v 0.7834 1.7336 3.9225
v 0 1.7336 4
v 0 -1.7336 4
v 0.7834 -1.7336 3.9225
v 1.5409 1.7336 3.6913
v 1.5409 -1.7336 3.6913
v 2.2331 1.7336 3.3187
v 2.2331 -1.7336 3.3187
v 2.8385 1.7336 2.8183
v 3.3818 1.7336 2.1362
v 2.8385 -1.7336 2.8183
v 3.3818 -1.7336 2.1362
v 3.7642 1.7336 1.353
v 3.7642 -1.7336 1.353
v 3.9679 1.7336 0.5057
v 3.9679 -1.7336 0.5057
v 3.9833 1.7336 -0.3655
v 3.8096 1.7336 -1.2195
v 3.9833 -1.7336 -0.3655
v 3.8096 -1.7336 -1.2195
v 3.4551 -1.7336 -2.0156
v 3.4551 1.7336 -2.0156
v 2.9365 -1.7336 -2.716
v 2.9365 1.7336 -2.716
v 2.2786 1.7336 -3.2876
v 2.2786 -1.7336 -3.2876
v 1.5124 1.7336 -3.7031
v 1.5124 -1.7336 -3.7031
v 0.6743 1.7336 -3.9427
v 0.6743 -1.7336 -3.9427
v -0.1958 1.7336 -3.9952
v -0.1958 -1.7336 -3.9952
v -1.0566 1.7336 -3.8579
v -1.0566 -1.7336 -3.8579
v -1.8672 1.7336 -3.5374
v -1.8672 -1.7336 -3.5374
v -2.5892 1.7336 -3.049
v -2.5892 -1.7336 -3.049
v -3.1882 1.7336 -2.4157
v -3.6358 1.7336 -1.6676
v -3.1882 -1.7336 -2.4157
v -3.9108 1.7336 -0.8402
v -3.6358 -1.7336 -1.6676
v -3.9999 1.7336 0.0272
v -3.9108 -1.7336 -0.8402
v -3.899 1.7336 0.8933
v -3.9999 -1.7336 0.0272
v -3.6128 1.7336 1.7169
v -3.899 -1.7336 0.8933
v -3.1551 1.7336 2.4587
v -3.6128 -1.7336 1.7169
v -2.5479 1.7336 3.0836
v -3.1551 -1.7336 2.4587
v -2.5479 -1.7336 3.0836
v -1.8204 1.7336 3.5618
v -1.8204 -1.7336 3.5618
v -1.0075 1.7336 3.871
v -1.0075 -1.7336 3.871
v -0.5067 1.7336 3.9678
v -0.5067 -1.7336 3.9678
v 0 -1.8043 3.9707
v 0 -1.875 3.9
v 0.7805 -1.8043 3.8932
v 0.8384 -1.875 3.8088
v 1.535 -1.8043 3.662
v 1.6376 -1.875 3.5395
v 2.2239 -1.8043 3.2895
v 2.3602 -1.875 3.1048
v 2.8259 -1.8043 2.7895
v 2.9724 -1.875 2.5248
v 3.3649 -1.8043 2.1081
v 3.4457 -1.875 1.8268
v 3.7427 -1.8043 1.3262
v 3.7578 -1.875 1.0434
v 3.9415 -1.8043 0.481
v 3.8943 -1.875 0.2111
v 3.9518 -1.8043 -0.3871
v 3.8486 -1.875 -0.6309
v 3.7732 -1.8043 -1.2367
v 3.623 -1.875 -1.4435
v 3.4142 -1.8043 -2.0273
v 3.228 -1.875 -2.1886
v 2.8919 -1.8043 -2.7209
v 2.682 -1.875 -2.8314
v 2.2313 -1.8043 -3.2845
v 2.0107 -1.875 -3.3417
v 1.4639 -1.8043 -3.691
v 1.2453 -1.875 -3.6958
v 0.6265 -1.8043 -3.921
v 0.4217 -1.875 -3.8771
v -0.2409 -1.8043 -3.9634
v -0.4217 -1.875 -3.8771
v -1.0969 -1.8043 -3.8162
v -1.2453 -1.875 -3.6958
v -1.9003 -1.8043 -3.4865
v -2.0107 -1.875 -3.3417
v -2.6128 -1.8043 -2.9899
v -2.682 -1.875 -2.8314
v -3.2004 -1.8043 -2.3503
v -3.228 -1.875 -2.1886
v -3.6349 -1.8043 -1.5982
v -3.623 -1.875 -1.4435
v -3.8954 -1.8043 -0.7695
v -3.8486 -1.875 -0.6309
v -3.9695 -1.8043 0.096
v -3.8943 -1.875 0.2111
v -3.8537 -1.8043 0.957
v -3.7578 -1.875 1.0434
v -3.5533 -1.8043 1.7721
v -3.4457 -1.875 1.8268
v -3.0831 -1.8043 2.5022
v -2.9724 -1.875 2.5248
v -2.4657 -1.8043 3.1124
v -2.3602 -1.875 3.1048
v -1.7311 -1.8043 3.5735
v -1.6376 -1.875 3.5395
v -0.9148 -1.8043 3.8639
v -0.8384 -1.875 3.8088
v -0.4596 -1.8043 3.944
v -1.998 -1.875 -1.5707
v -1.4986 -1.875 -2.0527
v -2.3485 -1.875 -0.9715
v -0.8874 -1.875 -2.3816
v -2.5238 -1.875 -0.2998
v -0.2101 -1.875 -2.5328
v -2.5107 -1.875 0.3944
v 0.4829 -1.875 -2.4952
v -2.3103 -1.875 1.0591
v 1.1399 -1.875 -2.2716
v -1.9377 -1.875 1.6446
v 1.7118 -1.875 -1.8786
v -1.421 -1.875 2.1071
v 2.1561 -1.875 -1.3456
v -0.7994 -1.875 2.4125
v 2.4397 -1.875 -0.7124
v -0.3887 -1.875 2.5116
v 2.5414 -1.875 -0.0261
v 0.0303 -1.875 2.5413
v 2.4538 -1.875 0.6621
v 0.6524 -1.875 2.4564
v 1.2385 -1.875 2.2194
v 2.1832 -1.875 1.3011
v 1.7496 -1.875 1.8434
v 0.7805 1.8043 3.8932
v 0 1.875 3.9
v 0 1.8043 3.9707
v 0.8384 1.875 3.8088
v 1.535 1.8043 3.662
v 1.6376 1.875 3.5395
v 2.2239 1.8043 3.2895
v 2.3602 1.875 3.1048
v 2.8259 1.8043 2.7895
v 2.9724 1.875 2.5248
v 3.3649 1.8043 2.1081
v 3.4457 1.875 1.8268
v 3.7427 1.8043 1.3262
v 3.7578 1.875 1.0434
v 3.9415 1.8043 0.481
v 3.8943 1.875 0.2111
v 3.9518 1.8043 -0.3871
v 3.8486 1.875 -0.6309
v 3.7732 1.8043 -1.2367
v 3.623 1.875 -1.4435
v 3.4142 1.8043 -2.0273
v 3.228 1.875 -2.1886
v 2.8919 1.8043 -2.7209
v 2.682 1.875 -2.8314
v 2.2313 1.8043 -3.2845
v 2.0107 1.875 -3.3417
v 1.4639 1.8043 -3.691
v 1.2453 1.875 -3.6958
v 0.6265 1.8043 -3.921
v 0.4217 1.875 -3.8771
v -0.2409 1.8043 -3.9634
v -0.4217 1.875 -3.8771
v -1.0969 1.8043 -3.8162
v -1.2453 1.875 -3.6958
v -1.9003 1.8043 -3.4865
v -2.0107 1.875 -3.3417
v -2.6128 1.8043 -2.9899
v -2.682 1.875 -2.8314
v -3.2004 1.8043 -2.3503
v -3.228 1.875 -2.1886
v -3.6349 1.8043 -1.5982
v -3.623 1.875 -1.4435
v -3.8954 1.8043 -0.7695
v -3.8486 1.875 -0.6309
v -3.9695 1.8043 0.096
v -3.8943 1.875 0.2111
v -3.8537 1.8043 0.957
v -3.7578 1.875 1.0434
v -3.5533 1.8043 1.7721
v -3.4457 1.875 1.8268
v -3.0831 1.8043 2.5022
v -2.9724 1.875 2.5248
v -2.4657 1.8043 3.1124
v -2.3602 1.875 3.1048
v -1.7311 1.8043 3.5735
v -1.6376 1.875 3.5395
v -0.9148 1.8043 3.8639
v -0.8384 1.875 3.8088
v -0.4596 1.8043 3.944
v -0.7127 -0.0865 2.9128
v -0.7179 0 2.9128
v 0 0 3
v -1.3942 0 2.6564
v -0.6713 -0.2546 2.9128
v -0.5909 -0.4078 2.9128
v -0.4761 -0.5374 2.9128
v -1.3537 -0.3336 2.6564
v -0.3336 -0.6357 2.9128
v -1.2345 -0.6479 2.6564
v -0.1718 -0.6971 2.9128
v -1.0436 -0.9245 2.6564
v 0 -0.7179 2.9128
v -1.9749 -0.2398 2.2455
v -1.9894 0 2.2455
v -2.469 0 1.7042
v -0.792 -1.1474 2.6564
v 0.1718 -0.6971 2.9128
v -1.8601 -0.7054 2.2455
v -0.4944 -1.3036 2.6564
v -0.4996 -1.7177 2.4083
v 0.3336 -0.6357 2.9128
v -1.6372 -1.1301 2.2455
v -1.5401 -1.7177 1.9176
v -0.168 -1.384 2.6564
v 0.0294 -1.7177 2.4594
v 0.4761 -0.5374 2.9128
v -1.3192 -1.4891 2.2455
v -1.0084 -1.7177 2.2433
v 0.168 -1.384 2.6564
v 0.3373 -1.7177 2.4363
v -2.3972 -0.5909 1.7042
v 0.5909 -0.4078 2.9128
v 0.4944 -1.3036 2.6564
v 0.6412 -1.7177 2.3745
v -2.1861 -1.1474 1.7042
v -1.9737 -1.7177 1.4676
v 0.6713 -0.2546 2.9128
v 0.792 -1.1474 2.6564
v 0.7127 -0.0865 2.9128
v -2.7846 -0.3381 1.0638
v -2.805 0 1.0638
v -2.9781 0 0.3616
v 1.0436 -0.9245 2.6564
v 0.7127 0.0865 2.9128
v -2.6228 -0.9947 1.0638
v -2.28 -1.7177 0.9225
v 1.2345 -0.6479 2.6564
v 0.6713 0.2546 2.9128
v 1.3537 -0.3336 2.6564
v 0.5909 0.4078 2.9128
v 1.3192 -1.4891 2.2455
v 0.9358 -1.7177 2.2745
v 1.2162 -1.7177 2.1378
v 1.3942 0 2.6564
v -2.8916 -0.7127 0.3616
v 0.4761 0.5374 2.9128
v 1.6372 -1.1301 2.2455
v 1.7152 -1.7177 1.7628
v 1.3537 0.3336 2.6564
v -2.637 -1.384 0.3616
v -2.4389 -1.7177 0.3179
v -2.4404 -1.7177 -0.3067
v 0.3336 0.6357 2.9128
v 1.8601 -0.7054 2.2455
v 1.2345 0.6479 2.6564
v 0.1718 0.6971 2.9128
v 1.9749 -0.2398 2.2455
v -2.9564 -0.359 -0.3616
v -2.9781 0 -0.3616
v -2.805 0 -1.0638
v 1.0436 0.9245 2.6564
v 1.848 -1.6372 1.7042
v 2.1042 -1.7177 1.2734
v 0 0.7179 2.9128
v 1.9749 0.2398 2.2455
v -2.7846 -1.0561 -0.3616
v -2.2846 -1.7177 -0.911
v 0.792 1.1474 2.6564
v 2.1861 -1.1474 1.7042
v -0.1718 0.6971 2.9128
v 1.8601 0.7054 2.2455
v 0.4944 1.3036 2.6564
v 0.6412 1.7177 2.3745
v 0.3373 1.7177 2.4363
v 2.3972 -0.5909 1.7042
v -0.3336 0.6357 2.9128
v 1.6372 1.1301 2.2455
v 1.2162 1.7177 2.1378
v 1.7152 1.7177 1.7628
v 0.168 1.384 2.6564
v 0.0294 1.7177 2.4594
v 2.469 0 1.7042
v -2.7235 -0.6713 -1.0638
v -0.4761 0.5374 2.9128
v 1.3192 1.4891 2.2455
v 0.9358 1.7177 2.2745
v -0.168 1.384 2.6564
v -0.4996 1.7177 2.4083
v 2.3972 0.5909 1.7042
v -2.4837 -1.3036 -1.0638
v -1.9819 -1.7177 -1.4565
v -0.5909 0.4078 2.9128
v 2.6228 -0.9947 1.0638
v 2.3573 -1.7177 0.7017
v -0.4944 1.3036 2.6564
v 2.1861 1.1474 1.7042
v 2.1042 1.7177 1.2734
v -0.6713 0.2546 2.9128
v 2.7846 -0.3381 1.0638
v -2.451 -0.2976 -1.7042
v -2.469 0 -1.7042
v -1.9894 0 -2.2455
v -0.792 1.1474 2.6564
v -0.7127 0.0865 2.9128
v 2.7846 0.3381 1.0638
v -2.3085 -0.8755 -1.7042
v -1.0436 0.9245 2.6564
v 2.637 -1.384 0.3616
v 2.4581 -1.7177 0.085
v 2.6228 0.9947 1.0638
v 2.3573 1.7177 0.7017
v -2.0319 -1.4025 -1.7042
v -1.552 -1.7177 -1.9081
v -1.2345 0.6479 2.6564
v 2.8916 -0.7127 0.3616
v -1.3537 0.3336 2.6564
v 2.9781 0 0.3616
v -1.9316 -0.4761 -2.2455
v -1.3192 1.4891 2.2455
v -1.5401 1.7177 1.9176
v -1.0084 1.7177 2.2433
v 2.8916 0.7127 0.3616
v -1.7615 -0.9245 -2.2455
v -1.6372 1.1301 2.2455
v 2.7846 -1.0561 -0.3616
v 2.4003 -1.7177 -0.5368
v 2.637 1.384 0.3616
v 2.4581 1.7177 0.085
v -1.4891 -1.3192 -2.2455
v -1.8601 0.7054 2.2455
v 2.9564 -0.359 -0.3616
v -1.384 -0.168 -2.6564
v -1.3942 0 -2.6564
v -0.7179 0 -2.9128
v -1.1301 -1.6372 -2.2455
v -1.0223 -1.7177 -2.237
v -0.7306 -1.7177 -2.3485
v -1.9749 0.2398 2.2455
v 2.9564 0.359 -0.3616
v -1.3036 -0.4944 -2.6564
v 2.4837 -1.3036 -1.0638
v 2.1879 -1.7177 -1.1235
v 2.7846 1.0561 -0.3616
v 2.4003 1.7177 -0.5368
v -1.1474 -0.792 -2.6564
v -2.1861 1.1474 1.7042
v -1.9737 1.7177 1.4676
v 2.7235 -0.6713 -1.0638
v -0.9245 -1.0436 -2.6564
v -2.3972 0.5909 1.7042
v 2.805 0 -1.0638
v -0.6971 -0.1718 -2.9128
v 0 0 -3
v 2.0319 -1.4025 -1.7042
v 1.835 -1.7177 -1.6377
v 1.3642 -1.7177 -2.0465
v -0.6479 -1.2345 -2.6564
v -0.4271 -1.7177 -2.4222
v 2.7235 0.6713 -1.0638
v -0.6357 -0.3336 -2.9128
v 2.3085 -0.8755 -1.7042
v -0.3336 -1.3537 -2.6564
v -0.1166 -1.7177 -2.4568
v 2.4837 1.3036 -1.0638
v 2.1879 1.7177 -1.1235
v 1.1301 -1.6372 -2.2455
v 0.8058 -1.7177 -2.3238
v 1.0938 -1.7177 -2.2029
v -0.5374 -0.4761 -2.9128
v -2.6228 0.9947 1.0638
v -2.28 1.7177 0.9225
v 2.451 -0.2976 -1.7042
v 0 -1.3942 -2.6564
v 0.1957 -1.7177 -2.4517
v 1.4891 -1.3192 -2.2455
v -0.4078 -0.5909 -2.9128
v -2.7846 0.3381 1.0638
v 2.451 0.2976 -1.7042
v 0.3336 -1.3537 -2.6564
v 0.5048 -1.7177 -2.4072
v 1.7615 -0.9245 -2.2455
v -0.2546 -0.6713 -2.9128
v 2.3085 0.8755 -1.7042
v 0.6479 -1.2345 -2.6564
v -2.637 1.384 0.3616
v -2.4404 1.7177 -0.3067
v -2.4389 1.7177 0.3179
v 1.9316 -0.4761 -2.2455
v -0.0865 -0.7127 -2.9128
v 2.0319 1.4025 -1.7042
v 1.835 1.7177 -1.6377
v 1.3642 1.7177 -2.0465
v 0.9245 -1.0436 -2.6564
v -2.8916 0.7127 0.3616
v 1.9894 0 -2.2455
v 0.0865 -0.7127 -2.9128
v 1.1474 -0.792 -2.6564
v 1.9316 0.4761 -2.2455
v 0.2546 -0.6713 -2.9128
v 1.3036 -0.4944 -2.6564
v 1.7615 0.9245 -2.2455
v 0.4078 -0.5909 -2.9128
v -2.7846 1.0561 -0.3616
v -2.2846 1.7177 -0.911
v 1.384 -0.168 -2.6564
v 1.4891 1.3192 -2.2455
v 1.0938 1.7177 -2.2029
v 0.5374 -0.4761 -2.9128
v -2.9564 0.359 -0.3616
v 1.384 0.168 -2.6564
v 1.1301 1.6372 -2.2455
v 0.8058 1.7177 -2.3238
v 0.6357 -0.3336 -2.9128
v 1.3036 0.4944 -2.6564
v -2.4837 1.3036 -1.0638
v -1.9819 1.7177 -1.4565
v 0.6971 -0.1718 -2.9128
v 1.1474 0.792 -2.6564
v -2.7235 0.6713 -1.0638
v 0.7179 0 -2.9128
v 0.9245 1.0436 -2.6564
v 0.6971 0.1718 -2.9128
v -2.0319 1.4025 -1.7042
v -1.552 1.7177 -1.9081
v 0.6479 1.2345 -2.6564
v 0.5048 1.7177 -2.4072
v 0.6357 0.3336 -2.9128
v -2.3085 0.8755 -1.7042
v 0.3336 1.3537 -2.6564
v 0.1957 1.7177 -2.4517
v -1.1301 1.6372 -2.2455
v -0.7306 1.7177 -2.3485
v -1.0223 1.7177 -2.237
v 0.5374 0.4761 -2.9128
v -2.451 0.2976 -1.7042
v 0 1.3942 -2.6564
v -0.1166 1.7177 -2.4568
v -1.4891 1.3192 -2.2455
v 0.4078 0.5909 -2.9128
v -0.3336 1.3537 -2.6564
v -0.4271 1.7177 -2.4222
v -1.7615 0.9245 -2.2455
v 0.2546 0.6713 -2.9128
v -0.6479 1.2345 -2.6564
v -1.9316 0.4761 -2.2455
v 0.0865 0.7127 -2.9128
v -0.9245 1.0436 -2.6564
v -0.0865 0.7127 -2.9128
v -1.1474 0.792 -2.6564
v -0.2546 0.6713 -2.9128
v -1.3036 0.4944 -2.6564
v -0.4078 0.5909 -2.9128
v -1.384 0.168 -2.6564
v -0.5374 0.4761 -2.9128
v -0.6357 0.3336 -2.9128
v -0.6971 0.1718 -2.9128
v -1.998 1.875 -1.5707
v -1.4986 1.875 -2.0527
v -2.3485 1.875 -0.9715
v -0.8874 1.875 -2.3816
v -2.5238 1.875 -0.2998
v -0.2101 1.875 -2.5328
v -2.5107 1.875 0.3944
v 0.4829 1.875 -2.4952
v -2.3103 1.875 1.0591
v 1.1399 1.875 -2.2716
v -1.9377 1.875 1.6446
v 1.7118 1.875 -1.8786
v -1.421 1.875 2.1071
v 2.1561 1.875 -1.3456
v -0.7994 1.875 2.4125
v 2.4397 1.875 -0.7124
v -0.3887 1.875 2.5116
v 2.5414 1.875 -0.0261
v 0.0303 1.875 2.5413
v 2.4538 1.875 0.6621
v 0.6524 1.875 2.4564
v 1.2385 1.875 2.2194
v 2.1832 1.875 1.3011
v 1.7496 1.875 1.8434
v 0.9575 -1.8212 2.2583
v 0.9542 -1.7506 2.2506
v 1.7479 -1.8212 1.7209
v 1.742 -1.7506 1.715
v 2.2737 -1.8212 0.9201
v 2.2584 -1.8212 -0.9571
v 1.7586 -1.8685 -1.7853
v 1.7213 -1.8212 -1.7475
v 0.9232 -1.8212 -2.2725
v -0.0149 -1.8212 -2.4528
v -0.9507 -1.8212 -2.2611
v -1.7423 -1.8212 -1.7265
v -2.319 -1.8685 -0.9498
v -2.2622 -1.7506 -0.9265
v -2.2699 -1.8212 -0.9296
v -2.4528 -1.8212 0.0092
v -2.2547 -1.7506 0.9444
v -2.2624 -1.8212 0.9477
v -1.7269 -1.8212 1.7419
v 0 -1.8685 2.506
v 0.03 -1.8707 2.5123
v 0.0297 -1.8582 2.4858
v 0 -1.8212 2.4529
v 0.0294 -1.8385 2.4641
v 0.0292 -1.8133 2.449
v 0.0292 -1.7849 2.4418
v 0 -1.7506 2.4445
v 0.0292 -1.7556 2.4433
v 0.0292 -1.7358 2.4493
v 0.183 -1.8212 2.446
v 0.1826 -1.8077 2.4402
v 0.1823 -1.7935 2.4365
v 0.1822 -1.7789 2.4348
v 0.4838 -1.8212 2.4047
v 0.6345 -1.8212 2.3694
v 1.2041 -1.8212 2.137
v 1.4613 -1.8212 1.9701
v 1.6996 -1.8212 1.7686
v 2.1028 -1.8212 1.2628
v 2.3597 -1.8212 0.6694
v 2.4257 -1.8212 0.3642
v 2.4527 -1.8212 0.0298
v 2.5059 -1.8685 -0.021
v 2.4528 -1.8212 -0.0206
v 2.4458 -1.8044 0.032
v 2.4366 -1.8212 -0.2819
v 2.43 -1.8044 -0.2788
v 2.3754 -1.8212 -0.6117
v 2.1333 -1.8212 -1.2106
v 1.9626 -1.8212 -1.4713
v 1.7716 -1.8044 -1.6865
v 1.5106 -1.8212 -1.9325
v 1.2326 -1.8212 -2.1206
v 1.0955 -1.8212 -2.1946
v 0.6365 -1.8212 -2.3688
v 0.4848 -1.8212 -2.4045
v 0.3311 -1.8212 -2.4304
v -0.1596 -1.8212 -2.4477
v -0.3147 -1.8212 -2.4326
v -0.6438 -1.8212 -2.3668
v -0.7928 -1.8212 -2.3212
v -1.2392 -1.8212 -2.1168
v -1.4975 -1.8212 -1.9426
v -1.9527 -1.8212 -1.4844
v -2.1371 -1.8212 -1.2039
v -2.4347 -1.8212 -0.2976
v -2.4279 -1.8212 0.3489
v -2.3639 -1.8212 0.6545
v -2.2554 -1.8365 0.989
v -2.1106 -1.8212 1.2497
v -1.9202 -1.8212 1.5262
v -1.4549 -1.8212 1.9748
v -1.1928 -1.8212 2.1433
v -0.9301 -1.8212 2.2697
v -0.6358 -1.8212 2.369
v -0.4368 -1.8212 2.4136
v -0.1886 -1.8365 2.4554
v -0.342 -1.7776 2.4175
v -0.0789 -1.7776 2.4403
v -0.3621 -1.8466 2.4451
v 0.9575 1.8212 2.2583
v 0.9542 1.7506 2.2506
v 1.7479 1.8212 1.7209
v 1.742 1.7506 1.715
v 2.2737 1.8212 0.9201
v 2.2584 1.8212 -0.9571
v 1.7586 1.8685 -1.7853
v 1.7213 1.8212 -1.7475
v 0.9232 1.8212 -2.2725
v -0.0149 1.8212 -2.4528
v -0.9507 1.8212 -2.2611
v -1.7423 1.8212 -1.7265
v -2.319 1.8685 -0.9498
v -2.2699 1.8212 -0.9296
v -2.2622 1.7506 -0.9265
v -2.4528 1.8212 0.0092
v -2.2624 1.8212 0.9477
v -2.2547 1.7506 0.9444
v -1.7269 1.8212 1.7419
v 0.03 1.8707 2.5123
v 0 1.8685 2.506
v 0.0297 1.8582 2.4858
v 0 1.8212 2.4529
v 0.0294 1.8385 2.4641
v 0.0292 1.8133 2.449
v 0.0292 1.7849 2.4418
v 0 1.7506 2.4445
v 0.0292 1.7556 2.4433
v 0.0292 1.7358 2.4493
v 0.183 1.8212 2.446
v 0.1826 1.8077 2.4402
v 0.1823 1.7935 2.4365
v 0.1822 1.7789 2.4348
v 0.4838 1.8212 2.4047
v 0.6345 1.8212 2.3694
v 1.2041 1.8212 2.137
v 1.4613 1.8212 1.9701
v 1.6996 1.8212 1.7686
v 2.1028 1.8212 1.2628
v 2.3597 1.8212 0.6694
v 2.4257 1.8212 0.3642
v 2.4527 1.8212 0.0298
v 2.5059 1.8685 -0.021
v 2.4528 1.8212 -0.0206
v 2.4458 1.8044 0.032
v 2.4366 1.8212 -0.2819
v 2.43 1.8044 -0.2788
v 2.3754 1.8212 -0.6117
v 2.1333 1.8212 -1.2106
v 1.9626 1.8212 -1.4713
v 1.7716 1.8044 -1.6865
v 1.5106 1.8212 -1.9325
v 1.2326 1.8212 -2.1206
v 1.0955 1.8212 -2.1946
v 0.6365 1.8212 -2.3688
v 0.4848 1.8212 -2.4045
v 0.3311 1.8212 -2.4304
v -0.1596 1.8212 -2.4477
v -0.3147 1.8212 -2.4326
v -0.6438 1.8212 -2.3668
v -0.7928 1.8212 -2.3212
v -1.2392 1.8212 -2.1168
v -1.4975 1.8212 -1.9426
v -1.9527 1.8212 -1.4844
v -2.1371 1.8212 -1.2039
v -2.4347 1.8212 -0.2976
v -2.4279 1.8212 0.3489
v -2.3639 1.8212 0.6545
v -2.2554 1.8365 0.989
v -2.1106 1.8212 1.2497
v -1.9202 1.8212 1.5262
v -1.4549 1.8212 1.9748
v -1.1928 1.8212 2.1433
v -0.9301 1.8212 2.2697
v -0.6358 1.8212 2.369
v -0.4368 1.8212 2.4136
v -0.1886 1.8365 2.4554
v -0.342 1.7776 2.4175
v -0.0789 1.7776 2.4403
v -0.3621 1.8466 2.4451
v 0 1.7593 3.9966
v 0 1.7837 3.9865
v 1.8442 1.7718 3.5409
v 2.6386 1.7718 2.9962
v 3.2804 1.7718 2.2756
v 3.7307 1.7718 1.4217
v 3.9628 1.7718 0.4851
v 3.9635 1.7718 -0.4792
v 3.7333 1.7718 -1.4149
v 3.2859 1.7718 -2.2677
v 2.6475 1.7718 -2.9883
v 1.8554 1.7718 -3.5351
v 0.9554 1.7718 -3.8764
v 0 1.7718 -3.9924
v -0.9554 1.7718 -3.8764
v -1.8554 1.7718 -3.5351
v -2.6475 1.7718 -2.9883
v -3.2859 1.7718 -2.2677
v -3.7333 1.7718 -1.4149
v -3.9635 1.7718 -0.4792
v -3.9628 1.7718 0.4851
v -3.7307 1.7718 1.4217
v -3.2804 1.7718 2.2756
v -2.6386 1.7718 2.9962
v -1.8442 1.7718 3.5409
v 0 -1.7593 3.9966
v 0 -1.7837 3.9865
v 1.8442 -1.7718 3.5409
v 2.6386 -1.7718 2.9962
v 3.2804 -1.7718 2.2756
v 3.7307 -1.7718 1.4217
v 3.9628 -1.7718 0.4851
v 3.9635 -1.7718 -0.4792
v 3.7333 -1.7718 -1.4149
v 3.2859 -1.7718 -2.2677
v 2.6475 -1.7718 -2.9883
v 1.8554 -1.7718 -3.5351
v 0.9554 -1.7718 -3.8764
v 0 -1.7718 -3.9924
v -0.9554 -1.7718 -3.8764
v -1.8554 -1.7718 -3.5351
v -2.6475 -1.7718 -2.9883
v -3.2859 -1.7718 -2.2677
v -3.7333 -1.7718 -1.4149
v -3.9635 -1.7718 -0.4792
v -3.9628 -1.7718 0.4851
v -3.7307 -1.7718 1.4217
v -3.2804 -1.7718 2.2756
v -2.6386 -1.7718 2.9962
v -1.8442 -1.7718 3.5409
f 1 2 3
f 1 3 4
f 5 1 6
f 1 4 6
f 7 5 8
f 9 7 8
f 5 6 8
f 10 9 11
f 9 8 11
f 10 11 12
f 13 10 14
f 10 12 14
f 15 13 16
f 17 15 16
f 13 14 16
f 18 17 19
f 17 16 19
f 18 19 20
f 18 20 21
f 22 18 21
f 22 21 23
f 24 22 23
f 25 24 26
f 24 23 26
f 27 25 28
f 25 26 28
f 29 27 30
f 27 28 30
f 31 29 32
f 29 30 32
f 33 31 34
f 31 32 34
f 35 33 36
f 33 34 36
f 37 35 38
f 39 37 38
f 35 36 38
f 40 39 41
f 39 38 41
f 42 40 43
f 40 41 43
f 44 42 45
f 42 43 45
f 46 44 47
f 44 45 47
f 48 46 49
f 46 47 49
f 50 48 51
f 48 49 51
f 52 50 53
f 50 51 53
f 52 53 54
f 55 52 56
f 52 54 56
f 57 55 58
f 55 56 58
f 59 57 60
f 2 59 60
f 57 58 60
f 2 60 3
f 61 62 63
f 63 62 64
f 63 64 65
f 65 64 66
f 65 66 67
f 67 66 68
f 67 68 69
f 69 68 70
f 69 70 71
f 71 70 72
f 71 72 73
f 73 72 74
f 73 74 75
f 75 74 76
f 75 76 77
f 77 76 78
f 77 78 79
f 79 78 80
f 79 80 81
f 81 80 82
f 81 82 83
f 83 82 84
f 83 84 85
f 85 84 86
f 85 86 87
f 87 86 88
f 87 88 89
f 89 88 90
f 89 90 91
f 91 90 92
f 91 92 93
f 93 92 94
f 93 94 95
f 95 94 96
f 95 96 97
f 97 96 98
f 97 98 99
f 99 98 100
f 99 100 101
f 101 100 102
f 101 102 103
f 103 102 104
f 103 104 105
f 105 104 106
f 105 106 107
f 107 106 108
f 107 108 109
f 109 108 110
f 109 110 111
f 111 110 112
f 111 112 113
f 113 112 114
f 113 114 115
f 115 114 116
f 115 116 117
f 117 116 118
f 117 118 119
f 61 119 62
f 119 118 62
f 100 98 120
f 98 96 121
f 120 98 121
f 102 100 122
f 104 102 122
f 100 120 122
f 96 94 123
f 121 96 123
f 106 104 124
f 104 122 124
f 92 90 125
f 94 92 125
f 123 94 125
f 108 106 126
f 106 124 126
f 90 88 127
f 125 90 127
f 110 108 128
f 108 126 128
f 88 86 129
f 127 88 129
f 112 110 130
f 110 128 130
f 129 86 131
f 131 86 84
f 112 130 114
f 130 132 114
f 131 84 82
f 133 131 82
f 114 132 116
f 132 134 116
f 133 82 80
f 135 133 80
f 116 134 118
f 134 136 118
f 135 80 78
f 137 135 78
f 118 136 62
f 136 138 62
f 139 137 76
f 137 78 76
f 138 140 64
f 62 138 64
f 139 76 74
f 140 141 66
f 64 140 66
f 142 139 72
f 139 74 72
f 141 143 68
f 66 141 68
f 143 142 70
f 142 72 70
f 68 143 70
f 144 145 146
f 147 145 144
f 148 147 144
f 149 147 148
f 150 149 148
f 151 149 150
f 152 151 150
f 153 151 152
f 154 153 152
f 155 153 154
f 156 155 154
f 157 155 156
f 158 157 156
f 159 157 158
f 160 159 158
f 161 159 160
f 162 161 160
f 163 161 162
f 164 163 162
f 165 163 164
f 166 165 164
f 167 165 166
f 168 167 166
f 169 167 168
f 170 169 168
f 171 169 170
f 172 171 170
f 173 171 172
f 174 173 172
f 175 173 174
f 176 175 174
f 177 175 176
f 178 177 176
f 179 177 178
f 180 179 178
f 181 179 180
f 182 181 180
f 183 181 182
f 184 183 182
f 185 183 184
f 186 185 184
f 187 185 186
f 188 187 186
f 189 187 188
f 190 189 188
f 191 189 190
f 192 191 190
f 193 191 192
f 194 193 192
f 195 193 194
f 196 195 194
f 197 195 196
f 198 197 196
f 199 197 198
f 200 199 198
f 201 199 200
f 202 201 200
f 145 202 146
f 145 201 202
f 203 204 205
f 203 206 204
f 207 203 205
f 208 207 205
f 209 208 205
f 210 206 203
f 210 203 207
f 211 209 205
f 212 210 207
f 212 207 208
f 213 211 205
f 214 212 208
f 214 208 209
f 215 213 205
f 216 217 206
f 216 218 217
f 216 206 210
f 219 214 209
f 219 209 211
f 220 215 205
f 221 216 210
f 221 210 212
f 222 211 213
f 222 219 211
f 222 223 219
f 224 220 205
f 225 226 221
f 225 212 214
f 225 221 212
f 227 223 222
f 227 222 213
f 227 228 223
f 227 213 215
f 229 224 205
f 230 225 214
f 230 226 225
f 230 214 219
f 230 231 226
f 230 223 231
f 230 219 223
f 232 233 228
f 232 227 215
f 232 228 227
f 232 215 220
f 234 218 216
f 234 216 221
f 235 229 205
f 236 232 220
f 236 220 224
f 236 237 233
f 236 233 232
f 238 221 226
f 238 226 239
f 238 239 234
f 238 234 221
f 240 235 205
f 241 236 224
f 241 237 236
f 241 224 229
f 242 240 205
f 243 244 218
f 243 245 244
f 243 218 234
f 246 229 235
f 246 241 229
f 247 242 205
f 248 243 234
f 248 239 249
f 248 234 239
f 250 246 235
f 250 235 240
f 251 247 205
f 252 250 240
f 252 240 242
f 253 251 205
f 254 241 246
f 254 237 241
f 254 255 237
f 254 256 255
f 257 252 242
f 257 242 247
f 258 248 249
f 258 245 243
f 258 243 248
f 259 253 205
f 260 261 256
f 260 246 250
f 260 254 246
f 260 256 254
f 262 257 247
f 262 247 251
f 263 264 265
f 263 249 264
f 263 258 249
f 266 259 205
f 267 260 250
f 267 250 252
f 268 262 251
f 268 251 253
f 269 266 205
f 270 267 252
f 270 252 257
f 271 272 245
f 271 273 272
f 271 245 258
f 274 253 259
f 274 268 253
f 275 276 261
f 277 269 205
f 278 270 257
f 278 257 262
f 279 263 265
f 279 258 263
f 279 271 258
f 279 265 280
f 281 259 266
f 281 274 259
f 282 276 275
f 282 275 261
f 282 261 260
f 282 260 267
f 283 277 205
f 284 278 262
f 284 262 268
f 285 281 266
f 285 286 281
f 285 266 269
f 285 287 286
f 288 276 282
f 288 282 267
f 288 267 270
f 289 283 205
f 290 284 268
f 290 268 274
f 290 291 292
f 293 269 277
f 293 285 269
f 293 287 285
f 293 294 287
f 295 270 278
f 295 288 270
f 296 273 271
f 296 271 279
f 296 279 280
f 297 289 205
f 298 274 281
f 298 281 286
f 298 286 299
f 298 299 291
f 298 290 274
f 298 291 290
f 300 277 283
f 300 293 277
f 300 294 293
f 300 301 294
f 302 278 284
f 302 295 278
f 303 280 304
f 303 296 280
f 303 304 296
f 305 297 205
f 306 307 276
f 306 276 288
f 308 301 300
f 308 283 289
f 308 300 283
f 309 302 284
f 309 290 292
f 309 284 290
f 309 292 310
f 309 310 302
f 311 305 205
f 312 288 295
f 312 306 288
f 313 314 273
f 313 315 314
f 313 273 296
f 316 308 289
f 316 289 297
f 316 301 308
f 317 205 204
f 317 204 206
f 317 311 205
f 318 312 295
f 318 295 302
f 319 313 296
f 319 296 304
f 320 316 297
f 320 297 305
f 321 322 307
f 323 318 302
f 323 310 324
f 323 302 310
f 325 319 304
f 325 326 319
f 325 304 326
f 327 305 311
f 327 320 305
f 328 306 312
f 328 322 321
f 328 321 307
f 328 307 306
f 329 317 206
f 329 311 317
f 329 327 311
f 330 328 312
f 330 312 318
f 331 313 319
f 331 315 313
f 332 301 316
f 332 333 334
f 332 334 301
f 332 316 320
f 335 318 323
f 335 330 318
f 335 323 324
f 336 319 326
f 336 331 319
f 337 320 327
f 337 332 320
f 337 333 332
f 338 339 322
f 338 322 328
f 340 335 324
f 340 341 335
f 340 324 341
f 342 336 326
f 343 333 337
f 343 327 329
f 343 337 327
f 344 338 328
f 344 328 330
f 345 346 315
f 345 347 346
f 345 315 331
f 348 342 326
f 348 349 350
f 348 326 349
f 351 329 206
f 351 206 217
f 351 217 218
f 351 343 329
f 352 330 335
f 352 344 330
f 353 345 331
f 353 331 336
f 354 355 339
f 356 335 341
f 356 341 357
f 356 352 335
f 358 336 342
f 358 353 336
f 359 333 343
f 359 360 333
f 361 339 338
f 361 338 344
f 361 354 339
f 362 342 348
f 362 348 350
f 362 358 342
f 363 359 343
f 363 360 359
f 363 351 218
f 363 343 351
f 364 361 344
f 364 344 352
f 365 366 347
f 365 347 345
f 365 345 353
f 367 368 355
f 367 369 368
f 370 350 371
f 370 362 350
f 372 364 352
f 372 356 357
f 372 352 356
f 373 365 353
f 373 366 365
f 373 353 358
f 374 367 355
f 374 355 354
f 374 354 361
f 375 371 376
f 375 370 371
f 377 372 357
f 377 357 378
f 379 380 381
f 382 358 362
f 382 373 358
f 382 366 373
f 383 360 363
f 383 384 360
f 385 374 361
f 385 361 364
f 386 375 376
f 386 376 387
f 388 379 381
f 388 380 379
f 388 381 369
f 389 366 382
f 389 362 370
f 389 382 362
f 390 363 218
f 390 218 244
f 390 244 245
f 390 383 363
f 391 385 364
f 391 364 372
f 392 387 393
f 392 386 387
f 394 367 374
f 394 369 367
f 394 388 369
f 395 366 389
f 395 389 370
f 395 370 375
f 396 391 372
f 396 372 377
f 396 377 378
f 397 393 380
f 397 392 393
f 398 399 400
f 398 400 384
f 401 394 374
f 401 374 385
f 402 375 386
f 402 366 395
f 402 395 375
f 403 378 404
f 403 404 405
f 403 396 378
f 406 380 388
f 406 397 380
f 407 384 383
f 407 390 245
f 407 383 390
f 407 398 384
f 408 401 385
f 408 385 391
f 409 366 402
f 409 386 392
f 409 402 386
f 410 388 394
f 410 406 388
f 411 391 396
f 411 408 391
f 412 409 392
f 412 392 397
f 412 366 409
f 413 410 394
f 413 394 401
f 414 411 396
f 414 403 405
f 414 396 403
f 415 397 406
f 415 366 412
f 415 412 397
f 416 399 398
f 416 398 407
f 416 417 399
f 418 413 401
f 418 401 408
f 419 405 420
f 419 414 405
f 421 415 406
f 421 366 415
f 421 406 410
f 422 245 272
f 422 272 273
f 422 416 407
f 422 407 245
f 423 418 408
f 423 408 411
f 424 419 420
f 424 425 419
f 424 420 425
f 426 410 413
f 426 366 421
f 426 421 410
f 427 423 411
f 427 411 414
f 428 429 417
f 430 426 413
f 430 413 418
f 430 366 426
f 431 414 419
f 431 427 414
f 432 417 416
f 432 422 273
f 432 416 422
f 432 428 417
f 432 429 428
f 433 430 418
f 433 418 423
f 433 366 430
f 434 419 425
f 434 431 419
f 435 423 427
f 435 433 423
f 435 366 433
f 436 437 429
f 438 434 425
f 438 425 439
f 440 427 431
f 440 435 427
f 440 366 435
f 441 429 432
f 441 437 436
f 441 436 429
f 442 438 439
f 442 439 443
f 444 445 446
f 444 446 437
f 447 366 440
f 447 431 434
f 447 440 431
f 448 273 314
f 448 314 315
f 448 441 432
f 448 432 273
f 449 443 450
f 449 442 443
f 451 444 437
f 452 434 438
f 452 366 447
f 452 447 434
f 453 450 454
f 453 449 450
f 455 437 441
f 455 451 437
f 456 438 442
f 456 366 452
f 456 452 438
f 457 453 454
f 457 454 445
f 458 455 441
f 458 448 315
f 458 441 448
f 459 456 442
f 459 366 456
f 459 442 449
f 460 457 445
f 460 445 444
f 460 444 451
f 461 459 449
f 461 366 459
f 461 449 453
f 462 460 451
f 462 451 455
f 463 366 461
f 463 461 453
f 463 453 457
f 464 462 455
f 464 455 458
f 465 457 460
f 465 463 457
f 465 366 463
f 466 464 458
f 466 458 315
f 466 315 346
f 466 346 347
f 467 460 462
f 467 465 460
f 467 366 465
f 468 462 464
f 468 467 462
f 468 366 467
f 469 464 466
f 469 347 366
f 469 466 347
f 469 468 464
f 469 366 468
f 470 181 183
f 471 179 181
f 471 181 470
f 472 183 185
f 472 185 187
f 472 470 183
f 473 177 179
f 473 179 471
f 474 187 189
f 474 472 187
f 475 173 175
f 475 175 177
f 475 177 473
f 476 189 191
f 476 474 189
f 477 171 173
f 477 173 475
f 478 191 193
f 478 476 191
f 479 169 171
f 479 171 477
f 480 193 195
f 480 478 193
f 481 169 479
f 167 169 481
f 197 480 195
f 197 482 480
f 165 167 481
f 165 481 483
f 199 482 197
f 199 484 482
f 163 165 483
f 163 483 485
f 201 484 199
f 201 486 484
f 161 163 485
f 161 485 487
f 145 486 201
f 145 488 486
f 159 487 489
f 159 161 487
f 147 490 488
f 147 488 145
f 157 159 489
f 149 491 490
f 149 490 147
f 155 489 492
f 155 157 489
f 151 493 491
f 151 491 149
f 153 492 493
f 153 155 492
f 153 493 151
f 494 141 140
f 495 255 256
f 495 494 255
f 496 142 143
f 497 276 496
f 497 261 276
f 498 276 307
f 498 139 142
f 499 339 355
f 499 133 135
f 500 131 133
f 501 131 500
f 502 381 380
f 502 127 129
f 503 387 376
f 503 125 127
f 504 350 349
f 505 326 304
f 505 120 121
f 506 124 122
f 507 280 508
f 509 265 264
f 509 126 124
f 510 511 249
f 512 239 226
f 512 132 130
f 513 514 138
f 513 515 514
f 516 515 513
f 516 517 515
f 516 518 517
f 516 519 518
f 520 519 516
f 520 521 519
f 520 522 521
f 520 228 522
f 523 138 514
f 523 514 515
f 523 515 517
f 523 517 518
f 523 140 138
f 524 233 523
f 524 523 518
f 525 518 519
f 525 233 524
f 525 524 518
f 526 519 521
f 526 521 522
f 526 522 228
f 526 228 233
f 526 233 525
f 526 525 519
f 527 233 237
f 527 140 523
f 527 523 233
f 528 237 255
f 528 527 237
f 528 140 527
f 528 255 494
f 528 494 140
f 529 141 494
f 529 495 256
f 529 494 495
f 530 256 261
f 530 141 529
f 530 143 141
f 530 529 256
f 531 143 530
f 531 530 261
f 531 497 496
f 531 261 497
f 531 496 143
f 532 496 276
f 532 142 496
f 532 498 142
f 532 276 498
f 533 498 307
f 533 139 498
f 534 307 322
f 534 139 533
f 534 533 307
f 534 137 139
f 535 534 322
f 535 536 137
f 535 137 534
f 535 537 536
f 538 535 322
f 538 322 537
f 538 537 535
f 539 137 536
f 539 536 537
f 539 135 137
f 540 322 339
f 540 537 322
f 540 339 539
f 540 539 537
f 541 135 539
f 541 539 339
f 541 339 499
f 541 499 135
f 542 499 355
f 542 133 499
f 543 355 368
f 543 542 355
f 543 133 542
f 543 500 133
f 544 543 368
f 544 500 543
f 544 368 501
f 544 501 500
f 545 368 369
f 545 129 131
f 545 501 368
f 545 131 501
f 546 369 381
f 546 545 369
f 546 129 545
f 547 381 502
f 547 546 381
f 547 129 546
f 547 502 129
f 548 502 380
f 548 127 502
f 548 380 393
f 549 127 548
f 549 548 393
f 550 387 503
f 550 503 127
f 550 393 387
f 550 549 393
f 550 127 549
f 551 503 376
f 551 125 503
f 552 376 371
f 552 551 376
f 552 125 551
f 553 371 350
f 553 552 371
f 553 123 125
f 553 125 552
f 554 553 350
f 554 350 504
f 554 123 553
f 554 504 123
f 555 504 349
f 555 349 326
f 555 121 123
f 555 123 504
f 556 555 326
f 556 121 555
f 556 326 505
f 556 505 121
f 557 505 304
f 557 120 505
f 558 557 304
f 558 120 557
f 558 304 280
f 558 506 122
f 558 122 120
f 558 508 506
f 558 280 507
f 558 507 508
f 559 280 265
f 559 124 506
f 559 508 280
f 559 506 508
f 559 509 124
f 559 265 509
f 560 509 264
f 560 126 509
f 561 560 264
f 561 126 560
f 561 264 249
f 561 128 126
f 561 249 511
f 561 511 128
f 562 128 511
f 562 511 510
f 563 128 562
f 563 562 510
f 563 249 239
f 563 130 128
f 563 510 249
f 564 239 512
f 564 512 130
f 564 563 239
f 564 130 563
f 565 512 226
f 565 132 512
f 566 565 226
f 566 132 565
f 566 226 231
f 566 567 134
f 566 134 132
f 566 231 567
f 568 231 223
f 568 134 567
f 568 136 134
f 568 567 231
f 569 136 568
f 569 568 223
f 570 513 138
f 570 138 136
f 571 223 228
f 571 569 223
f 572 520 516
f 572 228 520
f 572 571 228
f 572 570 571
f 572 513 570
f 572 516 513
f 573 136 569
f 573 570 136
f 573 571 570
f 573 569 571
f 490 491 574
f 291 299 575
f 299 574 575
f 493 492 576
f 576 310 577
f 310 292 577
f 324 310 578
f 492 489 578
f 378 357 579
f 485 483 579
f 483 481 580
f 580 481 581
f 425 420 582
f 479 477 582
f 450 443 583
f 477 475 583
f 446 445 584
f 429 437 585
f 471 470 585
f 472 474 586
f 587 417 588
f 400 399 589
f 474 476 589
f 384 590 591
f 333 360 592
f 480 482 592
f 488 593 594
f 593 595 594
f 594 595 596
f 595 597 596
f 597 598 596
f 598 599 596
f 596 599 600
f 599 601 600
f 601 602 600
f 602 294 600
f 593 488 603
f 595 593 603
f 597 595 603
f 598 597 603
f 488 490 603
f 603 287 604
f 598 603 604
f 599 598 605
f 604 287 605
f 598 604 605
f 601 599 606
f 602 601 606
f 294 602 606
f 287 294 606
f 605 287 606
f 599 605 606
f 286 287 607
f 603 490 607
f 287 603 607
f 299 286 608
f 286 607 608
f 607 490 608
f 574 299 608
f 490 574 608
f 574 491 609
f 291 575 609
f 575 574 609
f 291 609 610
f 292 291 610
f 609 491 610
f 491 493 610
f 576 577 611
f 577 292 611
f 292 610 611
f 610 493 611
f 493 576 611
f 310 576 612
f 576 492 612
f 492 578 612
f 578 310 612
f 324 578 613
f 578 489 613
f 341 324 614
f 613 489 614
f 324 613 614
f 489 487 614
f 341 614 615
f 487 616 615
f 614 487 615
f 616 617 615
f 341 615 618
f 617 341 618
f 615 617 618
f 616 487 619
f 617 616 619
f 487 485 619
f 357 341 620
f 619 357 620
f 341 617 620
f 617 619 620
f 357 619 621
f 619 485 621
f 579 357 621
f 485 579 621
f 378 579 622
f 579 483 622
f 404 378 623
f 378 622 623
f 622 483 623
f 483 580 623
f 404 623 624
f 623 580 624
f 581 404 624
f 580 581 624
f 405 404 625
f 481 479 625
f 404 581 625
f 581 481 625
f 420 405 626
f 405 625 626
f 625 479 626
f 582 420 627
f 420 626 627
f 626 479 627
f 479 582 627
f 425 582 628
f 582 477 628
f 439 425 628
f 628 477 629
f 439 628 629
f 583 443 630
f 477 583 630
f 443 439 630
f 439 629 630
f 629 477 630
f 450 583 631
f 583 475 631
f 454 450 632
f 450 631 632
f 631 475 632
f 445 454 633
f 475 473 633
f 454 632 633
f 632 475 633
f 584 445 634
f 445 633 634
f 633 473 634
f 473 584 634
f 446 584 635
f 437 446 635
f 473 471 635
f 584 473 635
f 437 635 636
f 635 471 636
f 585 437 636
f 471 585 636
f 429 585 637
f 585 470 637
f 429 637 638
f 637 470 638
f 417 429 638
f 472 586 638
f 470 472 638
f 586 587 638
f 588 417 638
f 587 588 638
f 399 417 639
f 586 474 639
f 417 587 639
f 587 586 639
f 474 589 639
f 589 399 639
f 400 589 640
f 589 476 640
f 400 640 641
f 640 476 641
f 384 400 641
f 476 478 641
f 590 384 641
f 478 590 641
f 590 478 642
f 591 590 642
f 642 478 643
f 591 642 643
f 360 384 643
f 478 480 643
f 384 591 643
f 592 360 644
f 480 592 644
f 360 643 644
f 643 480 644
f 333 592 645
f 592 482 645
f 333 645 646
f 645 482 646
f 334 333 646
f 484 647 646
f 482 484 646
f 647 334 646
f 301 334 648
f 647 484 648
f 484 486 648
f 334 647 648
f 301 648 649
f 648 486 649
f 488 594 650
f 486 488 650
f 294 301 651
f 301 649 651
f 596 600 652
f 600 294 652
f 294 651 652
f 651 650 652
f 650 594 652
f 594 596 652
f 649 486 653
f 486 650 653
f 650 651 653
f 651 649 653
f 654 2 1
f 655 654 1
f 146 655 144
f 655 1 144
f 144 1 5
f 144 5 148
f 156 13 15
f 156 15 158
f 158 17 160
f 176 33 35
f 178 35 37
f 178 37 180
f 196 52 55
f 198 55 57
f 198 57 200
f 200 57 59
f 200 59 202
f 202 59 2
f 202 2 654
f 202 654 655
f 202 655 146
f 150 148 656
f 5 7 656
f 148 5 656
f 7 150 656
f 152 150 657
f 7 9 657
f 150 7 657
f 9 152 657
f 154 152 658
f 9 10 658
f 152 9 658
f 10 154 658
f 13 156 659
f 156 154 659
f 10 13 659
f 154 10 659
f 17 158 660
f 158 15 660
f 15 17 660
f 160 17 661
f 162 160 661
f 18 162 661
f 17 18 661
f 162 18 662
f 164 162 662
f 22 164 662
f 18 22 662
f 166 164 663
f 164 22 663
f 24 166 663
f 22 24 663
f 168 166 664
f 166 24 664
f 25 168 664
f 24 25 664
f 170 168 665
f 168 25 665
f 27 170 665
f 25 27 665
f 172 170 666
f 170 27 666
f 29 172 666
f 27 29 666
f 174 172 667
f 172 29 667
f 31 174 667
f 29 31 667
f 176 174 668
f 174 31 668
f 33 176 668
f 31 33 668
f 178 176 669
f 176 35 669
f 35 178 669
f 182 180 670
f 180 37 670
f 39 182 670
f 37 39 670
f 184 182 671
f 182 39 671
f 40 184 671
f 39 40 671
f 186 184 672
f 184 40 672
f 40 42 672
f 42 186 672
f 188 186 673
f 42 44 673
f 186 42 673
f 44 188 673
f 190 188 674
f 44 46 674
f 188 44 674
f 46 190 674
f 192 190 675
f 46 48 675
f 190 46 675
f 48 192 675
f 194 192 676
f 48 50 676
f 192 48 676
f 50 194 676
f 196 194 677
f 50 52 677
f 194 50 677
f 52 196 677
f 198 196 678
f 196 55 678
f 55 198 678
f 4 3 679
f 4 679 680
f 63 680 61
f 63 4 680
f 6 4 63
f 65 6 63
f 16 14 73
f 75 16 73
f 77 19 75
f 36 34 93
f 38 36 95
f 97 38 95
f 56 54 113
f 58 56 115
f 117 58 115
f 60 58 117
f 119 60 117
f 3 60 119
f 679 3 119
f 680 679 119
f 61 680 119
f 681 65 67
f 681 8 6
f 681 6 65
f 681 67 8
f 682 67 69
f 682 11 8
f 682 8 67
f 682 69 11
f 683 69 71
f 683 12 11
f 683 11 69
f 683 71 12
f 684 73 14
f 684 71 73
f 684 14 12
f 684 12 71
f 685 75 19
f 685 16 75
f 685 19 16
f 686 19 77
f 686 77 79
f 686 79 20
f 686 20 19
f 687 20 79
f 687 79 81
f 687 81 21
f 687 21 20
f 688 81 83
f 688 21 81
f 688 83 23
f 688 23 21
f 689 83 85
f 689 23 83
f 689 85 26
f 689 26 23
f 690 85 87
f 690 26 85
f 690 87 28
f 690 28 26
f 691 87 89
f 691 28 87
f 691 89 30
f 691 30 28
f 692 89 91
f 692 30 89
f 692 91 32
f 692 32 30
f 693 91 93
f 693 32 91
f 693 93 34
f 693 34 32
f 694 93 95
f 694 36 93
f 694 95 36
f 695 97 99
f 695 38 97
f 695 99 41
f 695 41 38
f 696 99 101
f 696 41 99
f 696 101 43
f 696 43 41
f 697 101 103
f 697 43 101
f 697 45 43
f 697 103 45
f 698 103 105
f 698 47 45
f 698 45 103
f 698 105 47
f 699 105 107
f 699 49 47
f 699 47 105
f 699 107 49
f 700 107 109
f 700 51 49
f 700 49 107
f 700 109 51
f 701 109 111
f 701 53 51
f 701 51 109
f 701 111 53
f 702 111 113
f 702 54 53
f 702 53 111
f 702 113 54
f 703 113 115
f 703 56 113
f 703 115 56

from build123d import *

# Parameters (mm, degrees)
BOSS_EXTRUDE1_DEPTH      = 1.875
BOSS_EXTRUDE1_DEPTH_BACK = 1.875
SKETCH1_R                = 4
SKETCH1_R_2              = 2
CHAMFER1_SIZE            = 0.1
FILLET1_R                = 0.1
FILLET2_R                = 0.1


with BuildPart() as part:
    # Sketch1 → Boss-Extrude1 (new, two sides: drawn at the far end of the back side and taken through both)
    with BuildSketch(Plane(origin=(0, 0, 0), x_dir=(1, 0, 0), z_dir=(0, 1, 0)).offset(-BOSS_EXTRUDE1_DEPTH_BACK)):
        Circle(SKETCH1_R)
        Circle(SKETCH1_R_2, mode=Mode.SUBTRACT)
    extrude(amount=BOSS_EXTRUDE1_DEPTH + BOSS_EXTRUDE1_DEPTH_BACK)


with BuildPart() as body_2:
    # Sketch2 → Revolve1 (revolve)
    with BuildSketch(Plane(origin=(0, 0, 0), x_dir=(1, 0, 0), z_dir=(0, 1, 0))):
        with BuildLine():
            Line((0, 3), (0, -3))
            ThreePointArc((0, -3), (-3, 0), (0, 3))
        make_face()
    revolve(axis=Axis((0, 0, -3), (0, 0, 1)))


with BuildPart() as part_1:
    add(part.part)

    # Combine1: cut body 2
    add(body_2.part, mode=Mode.SUBTRACT)

    # Chamfer1
    chamfer1_edges = [part_1.edges().sort_by_distance(p)[0] for p in [
        (-4, 1.875, 0),
        (-4, -1.875, 0),
    ]]
    chamfer(chamfer1_edges, length=CHAMFER1_SIZE)

    # Fillet1
    fillet1_edges = [part_1.edges().sort_by_distance(p)[0] for p in [
        (-4, -1.775, 0),
        (-4, 1.775, 0),
    ]]
    fillet(fillet1_edges, radius=FILLET1_R)

    # Fillet2
    fillet2_edges = [part_1.edges().sort_by_distance(p)[0] for p in [
        (0, -1.875, -2.341874249),
        (0, 1.875, -2.341874249),
    ]]
    fillet(fillet2_edges, radius=FILLET2_R)


solid = part_1.part
